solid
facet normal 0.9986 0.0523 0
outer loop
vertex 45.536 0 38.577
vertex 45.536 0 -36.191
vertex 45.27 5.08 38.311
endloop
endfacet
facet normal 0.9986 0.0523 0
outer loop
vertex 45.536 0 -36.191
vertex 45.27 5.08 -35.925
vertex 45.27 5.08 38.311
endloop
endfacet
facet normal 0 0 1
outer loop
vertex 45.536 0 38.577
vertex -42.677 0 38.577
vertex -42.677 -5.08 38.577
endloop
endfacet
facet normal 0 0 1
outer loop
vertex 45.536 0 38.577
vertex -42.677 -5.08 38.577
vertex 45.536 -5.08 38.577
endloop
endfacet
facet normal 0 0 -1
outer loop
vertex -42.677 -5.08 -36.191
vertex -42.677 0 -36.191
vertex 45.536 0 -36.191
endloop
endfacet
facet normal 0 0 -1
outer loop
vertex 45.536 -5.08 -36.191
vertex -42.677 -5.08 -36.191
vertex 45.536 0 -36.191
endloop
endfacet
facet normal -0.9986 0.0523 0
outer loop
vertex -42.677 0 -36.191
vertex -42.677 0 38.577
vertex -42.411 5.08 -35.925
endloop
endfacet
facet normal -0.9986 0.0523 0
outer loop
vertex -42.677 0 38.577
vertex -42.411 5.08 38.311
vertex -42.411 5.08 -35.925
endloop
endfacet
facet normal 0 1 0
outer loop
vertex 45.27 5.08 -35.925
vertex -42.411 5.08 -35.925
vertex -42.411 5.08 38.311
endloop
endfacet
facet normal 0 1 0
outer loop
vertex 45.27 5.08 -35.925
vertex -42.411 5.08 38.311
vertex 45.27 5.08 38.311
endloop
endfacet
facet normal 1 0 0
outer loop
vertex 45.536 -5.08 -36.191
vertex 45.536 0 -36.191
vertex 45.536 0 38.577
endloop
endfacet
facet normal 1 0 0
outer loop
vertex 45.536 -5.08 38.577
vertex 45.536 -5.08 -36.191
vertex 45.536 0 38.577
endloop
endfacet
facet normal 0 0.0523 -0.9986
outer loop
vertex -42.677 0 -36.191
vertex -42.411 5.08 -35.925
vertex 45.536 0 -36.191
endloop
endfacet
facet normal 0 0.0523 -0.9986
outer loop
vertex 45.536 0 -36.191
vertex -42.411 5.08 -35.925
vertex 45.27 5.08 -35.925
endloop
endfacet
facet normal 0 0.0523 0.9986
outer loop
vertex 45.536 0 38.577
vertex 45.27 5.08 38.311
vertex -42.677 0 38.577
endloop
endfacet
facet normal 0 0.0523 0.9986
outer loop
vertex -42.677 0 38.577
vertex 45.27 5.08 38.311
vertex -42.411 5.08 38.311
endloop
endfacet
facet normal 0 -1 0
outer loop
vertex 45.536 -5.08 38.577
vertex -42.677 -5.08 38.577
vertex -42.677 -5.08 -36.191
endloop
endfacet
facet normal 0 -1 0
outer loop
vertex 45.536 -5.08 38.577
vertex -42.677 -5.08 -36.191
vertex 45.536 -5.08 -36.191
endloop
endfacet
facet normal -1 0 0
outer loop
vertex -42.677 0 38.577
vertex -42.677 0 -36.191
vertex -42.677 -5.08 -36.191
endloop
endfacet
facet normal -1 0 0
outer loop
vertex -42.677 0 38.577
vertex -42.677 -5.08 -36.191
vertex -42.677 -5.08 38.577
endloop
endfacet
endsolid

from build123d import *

# Parameters (mm, degrees)
F0_W          = 88.2137492299
F0_H          = 74.7685357928
F1_DEPTH      = 5.08
F1_DEPTH_BACK = 5.08
F1_TAPER_BACK = 3


with BuildPart() as f1:
    # F0 (on Front) → F1 (new body, two sides)
    with BuildSketch(Plane.XZ) as f1_sk:
        with Locations((1.429464668, 1.1932216585)):
            Rectangle(F0_W, F0_H)
    extrude(amount=F1_DEPTH)
    extrude(f1_sk.sketch, amount=-F1_DEPTH_BACK, taper=F1_TAPER_BACK)


solid = f1.part
